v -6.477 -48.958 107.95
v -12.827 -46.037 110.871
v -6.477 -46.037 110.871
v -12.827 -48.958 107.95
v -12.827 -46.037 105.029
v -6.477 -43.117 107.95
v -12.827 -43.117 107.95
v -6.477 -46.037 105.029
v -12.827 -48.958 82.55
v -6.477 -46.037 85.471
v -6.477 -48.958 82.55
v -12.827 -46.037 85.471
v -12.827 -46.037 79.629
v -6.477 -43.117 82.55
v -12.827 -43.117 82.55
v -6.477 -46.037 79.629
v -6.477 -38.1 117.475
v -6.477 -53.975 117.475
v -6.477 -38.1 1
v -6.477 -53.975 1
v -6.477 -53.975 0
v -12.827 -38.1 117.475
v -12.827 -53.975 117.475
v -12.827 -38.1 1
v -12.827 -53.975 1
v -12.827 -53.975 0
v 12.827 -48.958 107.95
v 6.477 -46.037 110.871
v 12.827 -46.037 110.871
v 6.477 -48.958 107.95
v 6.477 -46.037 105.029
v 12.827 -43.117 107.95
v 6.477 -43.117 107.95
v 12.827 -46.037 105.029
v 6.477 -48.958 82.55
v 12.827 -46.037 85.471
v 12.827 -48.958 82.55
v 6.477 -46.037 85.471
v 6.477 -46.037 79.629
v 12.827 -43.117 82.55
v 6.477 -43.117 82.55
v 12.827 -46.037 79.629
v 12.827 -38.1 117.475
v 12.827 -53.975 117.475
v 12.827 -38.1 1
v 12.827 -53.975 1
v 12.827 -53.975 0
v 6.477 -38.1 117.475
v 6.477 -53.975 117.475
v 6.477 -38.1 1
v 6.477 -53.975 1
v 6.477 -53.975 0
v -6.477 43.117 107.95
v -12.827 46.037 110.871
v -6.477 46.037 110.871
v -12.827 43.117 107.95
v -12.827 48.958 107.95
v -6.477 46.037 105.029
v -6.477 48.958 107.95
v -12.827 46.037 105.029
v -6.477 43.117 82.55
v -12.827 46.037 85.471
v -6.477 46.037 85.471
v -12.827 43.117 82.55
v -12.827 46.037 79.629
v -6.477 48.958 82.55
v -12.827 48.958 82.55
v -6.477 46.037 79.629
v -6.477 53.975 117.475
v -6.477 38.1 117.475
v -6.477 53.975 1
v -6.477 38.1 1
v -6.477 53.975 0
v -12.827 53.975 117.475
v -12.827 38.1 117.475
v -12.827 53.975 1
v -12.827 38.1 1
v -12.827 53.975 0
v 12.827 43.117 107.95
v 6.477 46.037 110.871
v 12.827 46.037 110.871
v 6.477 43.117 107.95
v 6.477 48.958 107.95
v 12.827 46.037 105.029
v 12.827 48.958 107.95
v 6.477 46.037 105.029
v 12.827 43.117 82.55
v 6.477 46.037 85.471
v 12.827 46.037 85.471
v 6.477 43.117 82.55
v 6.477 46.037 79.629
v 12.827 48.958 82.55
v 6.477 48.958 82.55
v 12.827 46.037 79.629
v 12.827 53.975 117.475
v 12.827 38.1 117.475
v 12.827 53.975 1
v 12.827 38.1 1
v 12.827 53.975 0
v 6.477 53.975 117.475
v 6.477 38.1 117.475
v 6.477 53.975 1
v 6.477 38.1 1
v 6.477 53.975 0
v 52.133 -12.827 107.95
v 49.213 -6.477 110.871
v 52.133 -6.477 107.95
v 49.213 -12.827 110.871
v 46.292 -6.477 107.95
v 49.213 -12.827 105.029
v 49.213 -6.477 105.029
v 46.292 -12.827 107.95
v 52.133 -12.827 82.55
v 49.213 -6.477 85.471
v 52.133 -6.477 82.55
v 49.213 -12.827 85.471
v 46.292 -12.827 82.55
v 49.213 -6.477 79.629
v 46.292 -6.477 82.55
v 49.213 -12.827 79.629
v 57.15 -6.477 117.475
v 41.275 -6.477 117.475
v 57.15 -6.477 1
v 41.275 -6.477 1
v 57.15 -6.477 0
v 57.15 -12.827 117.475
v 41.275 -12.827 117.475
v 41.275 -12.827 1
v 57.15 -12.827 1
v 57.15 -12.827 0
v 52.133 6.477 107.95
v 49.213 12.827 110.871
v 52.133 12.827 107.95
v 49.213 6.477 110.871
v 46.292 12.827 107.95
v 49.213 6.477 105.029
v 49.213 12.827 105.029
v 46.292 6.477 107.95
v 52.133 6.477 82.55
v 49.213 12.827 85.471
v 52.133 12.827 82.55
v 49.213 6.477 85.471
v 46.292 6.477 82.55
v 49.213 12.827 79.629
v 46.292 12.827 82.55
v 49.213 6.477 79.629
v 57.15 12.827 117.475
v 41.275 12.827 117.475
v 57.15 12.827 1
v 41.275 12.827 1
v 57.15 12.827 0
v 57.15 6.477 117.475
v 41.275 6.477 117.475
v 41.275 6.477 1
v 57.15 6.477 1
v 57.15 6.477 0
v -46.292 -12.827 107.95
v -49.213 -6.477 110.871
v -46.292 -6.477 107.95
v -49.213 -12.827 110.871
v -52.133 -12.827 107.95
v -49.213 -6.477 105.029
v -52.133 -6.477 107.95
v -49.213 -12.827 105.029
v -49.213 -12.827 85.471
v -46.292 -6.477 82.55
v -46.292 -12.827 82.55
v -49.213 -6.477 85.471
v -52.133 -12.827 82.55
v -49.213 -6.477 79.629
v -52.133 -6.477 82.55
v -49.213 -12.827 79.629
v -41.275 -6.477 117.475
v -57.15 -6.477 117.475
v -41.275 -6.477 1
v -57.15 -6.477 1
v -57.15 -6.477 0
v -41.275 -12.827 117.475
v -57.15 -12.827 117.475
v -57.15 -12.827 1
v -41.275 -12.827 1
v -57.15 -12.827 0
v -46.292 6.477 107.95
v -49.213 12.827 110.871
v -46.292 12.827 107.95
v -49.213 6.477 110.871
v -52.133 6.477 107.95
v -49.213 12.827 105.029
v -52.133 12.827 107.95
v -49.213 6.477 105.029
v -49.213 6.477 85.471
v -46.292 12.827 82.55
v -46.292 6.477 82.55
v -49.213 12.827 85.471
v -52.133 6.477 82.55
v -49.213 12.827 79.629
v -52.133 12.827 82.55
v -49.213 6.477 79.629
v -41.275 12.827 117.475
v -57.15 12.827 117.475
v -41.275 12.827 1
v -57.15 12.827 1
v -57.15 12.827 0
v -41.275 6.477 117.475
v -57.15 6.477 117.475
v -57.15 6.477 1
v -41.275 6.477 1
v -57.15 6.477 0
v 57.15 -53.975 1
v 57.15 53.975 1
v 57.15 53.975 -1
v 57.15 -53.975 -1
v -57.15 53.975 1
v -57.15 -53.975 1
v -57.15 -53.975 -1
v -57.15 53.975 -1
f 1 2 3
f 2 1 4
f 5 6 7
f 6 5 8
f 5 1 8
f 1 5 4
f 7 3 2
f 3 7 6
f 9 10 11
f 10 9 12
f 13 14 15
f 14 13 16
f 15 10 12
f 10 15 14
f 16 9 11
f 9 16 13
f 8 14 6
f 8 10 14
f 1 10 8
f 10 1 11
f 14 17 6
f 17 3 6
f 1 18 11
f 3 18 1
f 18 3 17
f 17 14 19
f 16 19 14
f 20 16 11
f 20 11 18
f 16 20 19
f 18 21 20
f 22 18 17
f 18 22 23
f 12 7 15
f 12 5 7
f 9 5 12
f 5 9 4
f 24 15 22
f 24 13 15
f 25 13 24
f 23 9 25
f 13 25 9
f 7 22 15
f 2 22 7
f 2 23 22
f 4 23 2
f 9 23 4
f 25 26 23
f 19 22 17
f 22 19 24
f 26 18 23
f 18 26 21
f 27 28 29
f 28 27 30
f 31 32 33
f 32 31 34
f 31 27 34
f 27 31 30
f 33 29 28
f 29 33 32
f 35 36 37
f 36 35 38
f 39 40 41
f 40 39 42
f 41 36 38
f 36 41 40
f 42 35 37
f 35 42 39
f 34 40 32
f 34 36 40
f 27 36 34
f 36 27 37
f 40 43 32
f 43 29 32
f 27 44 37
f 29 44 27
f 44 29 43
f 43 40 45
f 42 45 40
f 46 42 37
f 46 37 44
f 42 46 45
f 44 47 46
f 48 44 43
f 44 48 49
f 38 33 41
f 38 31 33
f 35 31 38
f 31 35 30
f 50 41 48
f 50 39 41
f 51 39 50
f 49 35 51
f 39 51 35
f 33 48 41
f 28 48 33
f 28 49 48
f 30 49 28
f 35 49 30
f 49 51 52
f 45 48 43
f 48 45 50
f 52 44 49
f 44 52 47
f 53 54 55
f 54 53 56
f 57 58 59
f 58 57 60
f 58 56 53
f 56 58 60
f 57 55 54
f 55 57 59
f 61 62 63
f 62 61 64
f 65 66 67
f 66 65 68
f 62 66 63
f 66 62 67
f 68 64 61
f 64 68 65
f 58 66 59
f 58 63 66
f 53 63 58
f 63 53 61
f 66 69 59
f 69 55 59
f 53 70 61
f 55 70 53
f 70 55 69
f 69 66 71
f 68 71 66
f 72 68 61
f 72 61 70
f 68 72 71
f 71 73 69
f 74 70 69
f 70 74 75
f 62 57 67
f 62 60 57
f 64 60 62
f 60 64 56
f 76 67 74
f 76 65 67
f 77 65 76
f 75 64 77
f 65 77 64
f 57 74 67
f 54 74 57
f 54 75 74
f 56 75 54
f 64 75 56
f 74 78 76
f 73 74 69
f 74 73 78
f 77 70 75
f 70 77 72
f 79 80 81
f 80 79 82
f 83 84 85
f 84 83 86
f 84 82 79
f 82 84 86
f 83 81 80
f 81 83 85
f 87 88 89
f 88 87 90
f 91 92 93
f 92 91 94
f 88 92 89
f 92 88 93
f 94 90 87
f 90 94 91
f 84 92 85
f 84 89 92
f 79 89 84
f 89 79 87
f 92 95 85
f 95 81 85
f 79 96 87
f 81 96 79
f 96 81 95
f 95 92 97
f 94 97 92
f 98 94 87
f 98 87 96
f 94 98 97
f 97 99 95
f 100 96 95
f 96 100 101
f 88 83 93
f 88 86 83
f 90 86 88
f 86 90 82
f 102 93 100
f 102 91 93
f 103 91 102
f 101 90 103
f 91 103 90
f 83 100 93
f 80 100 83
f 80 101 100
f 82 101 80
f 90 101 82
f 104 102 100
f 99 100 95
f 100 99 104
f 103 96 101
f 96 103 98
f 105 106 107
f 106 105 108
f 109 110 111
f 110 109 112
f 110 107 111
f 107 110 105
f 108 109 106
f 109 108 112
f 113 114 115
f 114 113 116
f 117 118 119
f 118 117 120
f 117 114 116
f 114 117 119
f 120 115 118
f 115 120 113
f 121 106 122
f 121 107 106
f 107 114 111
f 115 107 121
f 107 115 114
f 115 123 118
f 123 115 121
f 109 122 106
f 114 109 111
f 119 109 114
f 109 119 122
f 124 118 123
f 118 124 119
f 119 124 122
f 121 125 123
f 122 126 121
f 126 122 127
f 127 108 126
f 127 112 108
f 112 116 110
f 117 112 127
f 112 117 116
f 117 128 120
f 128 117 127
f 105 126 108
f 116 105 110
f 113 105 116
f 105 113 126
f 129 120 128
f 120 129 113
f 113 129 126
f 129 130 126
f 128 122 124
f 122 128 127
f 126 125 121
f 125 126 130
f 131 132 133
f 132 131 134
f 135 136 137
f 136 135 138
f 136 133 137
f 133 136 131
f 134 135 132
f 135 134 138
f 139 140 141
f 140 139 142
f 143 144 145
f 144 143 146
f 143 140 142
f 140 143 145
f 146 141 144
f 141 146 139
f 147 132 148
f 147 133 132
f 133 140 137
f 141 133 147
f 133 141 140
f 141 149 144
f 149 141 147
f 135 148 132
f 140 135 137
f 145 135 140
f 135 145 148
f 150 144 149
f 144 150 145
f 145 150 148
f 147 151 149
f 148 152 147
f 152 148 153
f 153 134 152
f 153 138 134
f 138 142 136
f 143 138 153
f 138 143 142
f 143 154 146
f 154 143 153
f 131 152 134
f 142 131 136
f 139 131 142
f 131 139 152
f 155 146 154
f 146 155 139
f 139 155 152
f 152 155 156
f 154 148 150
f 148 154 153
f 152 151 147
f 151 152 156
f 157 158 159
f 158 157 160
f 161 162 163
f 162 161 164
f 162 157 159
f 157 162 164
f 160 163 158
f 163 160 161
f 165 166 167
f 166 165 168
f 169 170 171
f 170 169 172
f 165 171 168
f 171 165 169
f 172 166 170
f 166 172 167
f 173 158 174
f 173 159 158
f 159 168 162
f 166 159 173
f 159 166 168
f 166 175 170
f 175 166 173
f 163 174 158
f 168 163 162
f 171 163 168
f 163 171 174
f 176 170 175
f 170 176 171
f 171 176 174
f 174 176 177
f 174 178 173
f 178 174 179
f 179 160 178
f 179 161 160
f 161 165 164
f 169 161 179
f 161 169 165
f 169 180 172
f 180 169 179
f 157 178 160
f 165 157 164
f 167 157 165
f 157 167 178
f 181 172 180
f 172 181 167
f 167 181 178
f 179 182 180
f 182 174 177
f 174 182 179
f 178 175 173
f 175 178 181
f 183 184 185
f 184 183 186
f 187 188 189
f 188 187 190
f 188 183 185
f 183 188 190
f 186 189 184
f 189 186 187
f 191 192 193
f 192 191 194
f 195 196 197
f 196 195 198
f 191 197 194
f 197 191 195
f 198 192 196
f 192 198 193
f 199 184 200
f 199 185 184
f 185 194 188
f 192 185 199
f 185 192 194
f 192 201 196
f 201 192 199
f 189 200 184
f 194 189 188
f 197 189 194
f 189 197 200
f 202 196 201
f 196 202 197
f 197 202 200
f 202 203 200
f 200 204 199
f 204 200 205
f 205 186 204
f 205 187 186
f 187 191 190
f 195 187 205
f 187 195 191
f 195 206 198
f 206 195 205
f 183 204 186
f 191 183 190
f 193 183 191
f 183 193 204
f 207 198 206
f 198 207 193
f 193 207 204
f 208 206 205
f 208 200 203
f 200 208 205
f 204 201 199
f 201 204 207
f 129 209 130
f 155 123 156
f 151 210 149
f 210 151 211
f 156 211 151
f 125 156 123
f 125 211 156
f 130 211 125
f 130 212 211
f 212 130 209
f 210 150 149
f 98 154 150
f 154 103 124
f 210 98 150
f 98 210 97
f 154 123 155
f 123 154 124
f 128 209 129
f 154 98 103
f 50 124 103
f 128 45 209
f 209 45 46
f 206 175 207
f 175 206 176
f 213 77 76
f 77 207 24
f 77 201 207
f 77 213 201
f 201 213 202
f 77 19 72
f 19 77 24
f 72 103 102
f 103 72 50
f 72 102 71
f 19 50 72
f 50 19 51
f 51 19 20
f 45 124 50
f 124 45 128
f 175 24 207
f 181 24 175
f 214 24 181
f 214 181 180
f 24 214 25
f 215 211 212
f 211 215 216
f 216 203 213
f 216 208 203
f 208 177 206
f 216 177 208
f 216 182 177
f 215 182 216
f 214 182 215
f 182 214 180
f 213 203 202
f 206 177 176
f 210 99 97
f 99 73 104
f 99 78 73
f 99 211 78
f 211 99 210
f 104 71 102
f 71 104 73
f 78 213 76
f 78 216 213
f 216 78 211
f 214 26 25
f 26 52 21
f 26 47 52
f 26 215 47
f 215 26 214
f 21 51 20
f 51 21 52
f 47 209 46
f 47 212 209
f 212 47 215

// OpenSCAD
// file: common.scad
// this contains functions and parameters common to both arm and hub files.

// converts x in inches to x in mm.
function i2mm(x) = x * 0.0254 * 1000;

// distance from hub center to first arm mount point. must be less than second arm mount point.
function first_mount_radius() = i2mm(1);

// distance from hub center to second arm mount point. must be greater than first arm mount point.
function second_mount_radius() = i2mm(2);

// diameter of hole for fasteners between arm and hub.
function hole_diam() = i2mm(1/8) + 0.25;

function arm_width() = i2mm(0.5);

// thickness of each of the 2 hub plates.
function hub_thickness() = i2mm(.25);

// thickness of each of arm plate.
function arm_thickness() = i2mm(0.25);

// distance between general-purpose mounting holes arranged in a square.
function gp_mount_dim() = i2mm(0.75);

// minimum distance to edge from general-purpose mounting holes.
function gp_mount_margin() = i2mm(0.125);

// overall width of pixhawk mount.
// nice to have all general-purpose modules (e.g. telemetry, gps, pixhawk) the same to avoid needing extra spacers for connecting them all to side struts.
function gp_module_width() = i2mm();

// makes the spacer that accomodates 1 arm plate and 1 hub plate.
module spacer() {
    // shell thickness of spacer that separates the motor from the top surface arm.
    spacer_thickness = 2;
    difference() {
        h = hub_thickness() + arm_thickness();
        od = hole_diam() + 2 * spacer_thickness;
        cube([od, od, h], center = true);
        id = hole_diam();
        cube([id, id, 2 * h], center = true);
    }
}
// main file
// Units are mm.

// Holds 1 large composite battery.
// This is mounted beneath the hub, by zip ties around 4 of the arms:
// forward, back, left, right.

use <common.scad>;


battery_width = i2mm(3.25);
battery_length = i2mm(3);
drop_height = i2mm(3.25);

bottom_thic = 2;
arm_thic = i2mm(0.25);
arm_width = i2mm(0.625);
arm_sep = i2mm(0.51);
zip_tie_hole_diam = i2mm(0.23) / sqrt(2);
hole_separation = i2mm(1);
hole_tab_len = i2mm(0.375); // length beyond upper zip tie hole.

module arm() {
    z = drop_height + hole_separation + hole_tab_len;
    difference() {
        translate([0, 0, z/2])
            cube(size = [arm_thic, arm_width, z], center = true);
        translate([0, 0, z - hole_tab_len]) {
            rotate([45, 0, 0])
                cube(size = [2 * arm_thic, zip_tie_hole_diam, zip_tie_hole_diam], center = true);
            translate([0, 0, -hole_separation])
                rotate([45, 0, 0])
                    cube(size = [2 * arm_thic, zip_tie_hole_diam, zip_tie_hole_diam], center = true);
        }
    }
}

module arm_pair() {
    dx = arm_sep / 2 + arm_thic / 2;
    translate([-dx, 0, 0])
        arm();
    translate([dx, 0, 0])
        arm();

}

dy = battery_length / 2 + arm_width / 2;
translate([0, -dy, 0])
    arm_pair();
translate([0, dy, 0])
    arm_pair();

dx = battery_width / 2 + arm_width / 2;
translate([dx, 0, 0])
    rotate([0, 0, 90])
        arm_pair();
translate([-dx, 0, 0])
    rotate([0, 0, 90])
        arm_pair();

cube(size = [battery_width + arm_width * 2, battery_length + arm_width * 2, bottom_thic], center = true);
